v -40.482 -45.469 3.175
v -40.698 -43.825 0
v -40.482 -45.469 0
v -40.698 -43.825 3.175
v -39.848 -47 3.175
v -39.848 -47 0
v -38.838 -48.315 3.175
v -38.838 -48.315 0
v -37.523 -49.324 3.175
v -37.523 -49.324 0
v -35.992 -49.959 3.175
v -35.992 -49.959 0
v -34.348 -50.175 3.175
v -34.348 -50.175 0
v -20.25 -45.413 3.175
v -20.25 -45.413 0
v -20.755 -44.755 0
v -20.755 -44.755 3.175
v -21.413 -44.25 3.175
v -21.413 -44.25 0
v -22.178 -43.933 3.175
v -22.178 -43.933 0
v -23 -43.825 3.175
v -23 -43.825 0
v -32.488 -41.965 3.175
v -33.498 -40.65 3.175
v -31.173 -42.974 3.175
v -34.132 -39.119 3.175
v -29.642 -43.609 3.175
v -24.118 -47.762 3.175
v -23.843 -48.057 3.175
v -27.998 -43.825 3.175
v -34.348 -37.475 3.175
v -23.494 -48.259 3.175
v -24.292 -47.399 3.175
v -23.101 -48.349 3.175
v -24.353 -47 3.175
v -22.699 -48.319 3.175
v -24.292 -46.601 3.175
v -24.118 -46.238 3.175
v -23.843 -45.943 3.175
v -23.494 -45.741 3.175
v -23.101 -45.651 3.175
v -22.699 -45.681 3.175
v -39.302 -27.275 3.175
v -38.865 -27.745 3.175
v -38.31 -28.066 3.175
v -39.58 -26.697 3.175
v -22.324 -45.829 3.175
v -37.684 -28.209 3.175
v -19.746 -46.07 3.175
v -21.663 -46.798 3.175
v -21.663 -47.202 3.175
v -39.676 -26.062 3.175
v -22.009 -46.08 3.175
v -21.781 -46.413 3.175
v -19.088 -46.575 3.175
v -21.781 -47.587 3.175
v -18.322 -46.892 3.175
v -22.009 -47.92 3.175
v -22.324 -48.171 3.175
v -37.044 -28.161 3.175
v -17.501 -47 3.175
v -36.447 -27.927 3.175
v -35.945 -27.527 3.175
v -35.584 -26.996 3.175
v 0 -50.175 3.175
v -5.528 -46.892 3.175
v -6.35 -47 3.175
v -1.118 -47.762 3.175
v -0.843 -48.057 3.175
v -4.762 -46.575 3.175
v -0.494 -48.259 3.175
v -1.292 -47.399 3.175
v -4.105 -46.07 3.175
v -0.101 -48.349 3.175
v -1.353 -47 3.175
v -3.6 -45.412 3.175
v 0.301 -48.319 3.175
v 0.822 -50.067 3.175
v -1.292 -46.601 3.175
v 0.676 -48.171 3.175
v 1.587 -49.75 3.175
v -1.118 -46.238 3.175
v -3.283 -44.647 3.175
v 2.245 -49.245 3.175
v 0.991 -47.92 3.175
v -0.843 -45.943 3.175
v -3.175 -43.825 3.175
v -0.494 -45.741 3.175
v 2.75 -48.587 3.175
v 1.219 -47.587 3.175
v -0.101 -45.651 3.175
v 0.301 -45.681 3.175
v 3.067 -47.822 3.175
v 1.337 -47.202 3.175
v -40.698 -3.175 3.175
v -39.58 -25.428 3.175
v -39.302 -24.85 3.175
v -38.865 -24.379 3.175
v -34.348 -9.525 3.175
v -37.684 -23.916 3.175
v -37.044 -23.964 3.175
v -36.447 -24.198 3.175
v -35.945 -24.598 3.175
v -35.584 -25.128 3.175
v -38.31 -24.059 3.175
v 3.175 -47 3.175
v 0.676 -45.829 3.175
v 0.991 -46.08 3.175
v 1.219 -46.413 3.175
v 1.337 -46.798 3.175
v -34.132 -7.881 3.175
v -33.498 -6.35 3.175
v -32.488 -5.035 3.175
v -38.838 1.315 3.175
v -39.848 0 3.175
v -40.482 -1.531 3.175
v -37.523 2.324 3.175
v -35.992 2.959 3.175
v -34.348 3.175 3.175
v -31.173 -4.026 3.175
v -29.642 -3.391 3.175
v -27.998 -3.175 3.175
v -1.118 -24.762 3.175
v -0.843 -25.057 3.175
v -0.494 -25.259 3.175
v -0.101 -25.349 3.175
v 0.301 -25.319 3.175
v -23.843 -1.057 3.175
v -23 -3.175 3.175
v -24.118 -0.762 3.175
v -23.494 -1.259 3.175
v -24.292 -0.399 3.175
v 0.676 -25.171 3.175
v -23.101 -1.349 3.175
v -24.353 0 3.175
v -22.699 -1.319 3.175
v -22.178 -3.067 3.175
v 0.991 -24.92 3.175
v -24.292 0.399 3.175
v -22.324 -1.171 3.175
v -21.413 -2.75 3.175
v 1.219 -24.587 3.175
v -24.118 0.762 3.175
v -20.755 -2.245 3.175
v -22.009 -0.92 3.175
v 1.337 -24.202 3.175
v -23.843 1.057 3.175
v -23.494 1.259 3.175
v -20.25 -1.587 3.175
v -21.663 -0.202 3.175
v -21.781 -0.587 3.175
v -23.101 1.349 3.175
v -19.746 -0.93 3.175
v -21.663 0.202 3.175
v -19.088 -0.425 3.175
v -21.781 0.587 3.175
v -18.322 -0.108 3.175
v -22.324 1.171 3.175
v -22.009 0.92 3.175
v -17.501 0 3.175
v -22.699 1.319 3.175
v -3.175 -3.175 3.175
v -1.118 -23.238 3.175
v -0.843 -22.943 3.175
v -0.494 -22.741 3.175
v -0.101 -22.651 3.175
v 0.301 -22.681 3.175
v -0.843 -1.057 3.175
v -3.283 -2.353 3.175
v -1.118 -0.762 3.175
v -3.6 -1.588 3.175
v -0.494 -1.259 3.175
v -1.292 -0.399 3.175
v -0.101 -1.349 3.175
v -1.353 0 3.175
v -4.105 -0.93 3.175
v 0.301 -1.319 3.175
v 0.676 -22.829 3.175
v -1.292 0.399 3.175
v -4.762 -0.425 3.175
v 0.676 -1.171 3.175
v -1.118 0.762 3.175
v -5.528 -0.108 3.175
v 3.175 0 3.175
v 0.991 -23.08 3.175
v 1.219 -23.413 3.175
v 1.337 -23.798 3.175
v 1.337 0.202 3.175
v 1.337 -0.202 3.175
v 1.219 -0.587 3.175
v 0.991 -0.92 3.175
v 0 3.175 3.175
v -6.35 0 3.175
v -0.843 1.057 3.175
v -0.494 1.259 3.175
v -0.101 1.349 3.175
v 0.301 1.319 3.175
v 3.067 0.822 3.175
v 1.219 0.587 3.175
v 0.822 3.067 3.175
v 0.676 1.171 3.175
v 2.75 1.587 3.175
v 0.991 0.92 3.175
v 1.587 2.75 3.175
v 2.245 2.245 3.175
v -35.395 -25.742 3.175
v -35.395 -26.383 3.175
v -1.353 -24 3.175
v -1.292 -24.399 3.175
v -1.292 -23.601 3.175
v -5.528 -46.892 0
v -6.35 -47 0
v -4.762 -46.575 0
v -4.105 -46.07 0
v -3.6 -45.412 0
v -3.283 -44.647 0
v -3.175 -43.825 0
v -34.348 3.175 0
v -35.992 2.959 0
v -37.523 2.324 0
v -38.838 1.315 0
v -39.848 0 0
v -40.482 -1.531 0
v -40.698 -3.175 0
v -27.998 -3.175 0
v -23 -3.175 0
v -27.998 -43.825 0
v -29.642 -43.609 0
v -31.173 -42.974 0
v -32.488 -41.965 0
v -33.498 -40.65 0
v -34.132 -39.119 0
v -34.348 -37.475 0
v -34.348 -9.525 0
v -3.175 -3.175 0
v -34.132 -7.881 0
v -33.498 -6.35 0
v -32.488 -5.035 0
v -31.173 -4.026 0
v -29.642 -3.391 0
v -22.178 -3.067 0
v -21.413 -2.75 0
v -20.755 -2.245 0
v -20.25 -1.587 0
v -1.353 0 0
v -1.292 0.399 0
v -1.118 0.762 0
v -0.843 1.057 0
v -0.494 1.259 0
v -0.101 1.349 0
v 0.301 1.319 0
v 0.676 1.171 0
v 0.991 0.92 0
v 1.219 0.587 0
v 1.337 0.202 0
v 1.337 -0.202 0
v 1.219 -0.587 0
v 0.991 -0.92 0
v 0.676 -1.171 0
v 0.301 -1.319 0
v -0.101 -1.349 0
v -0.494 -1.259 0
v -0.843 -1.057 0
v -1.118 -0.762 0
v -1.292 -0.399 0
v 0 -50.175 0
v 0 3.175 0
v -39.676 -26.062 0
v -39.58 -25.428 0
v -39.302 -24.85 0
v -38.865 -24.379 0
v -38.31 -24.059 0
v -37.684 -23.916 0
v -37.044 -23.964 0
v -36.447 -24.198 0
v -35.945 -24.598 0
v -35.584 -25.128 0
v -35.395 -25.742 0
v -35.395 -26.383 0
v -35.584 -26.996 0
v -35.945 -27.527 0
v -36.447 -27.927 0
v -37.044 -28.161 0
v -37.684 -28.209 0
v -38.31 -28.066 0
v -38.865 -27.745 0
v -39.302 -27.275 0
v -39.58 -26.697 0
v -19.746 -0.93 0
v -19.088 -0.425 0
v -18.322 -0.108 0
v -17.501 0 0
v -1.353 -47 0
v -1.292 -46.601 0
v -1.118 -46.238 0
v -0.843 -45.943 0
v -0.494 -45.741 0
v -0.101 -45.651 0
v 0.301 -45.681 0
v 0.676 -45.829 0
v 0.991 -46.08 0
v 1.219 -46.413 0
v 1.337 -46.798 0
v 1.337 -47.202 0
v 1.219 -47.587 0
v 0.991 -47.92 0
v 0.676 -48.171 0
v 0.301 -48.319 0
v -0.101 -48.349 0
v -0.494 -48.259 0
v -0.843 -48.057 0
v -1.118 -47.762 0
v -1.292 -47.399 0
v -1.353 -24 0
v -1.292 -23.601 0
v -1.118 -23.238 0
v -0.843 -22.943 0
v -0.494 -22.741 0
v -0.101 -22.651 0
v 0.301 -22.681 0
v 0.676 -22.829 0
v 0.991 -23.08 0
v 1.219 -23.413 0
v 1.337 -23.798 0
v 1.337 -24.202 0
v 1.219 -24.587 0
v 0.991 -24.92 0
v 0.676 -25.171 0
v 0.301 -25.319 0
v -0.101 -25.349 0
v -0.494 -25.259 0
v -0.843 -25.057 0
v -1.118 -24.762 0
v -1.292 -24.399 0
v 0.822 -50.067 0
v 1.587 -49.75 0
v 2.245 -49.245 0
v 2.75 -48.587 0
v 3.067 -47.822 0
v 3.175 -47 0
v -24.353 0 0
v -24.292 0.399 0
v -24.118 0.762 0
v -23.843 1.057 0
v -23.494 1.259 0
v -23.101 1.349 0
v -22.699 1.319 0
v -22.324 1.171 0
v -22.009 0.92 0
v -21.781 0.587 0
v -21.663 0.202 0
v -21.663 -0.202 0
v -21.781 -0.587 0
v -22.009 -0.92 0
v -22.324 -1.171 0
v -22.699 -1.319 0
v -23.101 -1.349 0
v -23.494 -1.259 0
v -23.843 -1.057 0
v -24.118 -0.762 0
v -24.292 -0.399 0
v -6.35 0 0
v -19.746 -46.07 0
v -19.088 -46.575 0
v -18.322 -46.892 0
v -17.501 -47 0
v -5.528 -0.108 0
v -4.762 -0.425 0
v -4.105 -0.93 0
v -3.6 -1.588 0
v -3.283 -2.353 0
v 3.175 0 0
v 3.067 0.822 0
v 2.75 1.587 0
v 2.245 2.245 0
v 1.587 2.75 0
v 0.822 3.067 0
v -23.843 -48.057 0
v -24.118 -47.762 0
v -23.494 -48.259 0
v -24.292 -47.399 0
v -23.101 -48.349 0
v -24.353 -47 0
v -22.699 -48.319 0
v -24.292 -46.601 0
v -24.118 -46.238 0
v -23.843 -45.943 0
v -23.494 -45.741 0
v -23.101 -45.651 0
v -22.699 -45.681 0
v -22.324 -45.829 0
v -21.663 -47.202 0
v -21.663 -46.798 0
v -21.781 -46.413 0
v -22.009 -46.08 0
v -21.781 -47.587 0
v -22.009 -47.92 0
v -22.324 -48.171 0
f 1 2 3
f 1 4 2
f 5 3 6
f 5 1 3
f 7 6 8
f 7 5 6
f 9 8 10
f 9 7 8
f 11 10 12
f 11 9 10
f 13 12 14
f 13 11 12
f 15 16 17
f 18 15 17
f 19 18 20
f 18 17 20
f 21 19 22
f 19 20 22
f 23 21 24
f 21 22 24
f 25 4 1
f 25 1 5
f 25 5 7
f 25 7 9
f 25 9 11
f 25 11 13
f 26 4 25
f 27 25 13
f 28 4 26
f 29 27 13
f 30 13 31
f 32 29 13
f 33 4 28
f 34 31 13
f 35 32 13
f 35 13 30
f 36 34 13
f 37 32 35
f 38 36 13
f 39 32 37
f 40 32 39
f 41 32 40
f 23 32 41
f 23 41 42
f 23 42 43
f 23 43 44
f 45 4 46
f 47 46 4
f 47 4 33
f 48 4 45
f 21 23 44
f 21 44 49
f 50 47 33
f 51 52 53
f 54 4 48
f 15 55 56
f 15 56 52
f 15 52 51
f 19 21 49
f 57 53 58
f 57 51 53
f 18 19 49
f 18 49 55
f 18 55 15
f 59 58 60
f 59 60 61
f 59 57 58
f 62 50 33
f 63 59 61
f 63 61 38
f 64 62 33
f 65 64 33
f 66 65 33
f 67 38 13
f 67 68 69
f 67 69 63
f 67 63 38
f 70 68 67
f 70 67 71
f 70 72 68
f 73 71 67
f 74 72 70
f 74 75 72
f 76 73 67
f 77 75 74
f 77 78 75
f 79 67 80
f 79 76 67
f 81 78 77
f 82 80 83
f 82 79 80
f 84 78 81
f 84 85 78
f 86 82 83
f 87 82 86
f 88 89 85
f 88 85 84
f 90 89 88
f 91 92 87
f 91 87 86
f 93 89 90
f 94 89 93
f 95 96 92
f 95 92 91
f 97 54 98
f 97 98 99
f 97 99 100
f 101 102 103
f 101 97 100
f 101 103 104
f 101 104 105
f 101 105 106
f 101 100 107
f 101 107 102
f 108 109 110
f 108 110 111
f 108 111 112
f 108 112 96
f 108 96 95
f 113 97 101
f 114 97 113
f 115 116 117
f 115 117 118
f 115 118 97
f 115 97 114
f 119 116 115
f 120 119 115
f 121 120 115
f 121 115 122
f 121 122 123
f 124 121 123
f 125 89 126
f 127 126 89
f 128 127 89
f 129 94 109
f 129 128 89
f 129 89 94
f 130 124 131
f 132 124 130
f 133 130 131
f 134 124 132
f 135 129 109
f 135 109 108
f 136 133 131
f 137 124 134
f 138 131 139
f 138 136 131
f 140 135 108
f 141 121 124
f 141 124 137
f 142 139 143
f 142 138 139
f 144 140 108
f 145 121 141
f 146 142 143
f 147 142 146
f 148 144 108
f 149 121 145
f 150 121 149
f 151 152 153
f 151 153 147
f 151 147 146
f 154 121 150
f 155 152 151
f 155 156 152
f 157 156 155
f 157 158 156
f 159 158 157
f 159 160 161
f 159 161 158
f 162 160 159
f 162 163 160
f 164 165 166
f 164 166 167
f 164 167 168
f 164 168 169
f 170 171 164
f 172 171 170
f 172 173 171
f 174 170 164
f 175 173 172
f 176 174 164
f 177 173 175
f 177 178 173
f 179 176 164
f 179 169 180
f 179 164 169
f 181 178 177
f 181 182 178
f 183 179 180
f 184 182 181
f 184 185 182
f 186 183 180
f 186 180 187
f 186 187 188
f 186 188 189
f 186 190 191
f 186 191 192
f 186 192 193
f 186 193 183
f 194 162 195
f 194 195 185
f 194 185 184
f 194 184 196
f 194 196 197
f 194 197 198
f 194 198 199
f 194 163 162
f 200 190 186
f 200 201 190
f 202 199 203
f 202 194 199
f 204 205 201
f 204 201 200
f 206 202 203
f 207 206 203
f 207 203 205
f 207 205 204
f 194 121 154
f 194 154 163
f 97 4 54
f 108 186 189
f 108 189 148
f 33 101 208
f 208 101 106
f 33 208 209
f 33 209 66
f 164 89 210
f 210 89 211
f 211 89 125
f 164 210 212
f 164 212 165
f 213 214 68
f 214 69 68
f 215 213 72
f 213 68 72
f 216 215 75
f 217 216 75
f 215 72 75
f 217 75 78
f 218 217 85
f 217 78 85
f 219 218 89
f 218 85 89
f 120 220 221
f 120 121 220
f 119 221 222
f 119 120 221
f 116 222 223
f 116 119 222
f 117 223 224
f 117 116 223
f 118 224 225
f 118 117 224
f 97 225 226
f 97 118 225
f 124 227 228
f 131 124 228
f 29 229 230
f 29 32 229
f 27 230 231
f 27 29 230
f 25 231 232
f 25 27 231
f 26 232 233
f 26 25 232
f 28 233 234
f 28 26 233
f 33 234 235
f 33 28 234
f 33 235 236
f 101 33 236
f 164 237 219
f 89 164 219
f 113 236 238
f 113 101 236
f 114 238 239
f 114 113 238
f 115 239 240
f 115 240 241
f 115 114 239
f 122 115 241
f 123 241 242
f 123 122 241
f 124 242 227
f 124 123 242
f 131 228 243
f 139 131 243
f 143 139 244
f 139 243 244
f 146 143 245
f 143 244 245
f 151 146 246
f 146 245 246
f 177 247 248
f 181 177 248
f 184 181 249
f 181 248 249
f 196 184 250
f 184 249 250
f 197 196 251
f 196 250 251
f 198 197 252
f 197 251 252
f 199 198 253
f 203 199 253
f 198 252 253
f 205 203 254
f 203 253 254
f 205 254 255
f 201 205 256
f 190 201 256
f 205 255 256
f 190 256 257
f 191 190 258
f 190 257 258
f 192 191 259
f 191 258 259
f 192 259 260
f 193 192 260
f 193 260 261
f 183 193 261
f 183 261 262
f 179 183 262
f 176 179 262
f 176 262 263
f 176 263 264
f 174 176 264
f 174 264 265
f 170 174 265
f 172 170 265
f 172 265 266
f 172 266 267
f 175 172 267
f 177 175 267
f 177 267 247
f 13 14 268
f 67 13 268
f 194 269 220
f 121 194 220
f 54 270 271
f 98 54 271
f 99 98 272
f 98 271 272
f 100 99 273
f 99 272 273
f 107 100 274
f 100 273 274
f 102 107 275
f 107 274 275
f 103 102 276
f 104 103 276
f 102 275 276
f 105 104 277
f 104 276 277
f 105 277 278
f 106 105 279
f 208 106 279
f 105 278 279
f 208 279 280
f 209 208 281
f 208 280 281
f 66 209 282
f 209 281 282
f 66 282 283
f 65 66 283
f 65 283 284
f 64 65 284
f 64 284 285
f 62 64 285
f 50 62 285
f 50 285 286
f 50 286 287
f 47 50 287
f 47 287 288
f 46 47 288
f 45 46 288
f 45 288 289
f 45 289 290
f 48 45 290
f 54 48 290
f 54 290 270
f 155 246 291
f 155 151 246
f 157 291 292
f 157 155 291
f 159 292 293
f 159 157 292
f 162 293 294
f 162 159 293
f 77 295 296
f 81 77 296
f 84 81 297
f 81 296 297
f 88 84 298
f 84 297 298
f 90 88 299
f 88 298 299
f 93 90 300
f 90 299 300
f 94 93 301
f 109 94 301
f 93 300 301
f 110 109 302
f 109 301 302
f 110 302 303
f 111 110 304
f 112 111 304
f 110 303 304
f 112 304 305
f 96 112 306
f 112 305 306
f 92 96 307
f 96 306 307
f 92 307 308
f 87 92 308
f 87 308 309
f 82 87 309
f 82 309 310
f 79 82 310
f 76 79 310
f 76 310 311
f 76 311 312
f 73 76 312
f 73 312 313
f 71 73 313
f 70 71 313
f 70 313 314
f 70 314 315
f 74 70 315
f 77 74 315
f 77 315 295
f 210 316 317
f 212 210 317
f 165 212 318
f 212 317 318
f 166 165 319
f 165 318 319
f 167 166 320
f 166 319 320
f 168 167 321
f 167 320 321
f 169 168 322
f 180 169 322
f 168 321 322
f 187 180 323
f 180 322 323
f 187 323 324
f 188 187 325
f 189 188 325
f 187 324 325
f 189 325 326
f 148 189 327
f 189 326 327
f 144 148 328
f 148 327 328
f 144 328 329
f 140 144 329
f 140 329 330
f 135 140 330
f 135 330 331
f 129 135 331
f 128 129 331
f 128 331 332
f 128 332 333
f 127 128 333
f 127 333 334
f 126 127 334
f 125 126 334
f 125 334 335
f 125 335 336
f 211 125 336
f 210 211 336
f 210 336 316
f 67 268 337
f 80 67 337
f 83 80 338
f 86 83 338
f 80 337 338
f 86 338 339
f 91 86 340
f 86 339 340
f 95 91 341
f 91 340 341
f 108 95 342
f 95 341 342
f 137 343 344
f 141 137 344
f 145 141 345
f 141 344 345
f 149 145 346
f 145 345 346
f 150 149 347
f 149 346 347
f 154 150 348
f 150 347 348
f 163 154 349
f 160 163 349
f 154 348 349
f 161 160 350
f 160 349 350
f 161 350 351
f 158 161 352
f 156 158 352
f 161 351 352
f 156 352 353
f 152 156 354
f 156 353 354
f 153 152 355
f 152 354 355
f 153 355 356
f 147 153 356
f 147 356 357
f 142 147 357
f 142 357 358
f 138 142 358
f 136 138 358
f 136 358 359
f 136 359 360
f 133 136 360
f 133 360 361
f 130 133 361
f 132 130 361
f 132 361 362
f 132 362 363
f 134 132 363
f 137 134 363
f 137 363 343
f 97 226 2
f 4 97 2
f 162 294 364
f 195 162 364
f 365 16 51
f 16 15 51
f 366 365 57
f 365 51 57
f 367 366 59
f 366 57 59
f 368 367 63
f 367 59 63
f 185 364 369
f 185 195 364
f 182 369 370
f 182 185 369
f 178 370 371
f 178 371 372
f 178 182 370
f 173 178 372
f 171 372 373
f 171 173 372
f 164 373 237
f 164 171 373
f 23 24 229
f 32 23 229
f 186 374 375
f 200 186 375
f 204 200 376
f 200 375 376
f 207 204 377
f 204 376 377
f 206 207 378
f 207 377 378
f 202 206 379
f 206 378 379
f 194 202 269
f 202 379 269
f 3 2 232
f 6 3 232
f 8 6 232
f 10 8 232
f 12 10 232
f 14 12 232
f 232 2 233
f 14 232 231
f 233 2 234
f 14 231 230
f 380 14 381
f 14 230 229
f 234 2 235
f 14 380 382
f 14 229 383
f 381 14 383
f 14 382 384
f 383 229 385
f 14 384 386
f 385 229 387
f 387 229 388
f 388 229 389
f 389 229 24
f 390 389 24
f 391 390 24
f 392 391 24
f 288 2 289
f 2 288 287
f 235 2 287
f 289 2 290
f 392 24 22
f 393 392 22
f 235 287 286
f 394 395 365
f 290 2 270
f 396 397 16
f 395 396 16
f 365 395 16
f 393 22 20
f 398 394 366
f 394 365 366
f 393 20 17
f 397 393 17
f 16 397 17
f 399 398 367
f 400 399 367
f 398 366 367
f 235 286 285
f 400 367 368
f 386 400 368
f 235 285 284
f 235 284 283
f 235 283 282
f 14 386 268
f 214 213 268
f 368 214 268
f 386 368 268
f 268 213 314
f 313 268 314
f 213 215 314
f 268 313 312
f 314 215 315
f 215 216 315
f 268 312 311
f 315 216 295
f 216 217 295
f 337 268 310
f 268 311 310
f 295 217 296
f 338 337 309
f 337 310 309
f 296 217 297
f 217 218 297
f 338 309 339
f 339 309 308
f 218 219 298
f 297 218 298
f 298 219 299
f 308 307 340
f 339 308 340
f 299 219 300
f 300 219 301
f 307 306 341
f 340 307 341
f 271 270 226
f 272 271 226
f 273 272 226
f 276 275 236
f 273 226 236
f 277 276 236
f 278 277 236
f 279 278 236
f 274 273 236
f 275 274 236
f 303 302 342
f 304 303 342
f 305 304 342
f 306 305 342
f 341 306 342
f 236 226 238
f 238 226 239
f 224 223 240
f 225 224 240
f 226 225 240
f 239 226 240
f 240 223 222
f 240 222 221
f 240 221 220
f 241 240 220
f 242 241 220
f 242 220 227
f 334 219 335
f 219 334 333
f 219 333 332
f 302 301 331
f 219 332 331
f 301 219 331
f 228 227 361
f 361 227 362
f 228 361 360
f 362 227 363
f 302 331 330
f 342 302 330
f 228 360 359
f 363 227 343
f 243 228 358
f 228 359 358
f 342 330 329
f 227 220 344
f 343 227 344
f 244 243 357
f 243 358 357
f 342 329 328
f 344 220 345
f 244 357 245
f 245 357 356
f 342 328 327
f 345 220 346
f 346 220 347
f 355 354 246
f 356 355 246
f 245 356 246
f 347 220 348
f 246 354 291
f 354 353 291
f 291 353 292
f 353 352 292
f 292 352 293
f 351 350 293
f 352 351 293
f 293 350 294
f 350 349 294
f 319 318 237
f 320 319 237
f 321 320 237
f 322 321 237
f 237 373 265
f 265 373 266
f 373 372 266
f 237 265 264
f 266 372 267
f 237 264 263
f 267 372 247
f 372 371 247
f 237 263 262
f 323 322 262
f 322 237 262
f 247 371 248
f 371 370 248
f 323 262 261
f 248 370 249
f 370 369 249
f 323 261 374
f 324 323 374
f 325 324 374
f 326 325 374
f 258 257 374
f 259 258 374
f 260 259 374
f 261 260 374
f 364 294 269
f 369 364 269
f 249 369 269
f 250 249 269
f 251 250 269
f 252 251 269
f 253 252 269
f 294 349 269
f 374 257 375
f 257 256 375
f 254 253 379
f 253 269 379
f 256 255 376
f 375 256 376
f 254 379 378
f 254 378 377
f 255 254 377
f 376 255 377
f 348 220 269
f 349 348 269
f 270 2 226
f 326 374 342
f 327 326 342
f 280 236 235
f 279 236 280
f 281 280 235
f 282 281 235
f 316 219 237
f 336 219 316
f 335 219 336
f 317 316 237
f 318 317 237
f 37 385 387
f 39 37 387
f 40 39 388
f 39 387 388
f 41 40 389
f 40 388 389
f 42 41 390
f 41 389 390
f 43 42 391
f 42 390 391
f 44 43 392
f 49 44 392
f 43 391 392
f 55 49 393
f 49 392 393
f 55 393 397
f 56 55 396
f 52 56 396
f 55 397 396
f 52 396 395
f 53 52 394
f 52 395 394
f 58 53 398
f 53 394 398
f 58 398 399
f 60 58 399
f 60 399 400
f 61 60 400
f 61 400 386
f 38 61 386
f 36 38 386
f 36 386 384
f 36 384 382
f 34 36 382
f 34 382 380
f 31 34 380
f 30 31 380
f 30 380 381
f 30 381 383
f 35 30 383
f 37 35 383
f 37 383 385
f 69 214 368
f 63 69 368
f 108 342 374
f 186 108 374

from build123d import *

# Parameters (mm, degrees)
BOSS_EXTRUDE1_DEPTH   = 3.175
F_6_CLEARANCE_HOLE1_D = 4.3053
F_2_CLEARANCE_HOLE1_D = 2.7051
FILLET1_R             = 3.175
FILLET2_R             = 6.35


with BuildPart() as part:
    # Sketch1 → Boss-Extrude1 (new body)
    with BuildSketch(Plane.XY):
        with BuildLine():
            Line((0, 3.175), (-40.698258, 3.175))
            Line((-40.698258, 3.175), (-40.698258, -50.175))
            Line((-40.698258, -50.175), (0, -50.175))
            ThreePointArc((0, -50.175), (2.24506403, -49.24506403), (3.175, -47))
            Line((3.175, -47), (3.175, 0))
            ThreePointArc((3.175, 0), (2.24506403, 2.24506403), (0, 3.175))
        make_face()
        with BuildLine():
            Line((-34.348258, -3.175), (-23, -3.175))
            ThreePointArc((-23, -3.175), (-20.75493597, -2.24506403), (-19.825, 0))
            Line((-19.825, 0), (-3.175, 0))
            Line((-3.175, 0), (-3.175, -47))
            Line((-3.175, -47), (-19.825, -47))
            ThreePointArc((-19.825, -47), (-20.75493597, -44.75493597), (-23, -43.825))
            Line((-23, -43.825), (-34.348258, -43.825))
            Line((-34.348258, -43.825), (-34.348258, -3.175))
        make_face(mode=Mode.SUBTRACT)
    extrude(amount=BOSS_EXTRUDE1_DEPTH)

    # #6 Clearance Hole1 (through all)
    with Locations(Plane.XY.offset(3.175)):
        with Locations((-37.523258, -26.062402)):
            Hole(F_6_CLEARANCE_HOLE1_D / 2)

    # #2 Clearance Hole1 (through all)
    with Locations(Plane.XY.offset(3.175)):
        with Locations((-23, -47), (0, -47), (0, 0), (-23, 0), (0, -24)):
            Hole(F_2_CLEARANCE_HOLE1_D / 2)

    # Fillet1
    fillet1_edges = [part.edges().sort_by_distance(p)[0] for p in [
        (-3.175, -47, 1.5875),
        (-3.175, 0, 1.5875),
        (-19.825, 0, 1.5875),
        (-19.825, -47, 1.5875),
    ]]
    fillet(fillet1_edges, radius=FILLET1_R)

    # Fillet2
    fillet2_edges = [part.edges().sort_by_distance(p)[0] for p in [
        (-40.698258, -50.175, 1.5875),
        (-40.698258, 3.175, 1.5875),
        (-34.348258, -3.175, 1.5875),
        (-34.348258, -43.825, 1.5875),
    ]]
    fillet(fillet2_edges, radius=FILLET2_R)


solid = part.part
